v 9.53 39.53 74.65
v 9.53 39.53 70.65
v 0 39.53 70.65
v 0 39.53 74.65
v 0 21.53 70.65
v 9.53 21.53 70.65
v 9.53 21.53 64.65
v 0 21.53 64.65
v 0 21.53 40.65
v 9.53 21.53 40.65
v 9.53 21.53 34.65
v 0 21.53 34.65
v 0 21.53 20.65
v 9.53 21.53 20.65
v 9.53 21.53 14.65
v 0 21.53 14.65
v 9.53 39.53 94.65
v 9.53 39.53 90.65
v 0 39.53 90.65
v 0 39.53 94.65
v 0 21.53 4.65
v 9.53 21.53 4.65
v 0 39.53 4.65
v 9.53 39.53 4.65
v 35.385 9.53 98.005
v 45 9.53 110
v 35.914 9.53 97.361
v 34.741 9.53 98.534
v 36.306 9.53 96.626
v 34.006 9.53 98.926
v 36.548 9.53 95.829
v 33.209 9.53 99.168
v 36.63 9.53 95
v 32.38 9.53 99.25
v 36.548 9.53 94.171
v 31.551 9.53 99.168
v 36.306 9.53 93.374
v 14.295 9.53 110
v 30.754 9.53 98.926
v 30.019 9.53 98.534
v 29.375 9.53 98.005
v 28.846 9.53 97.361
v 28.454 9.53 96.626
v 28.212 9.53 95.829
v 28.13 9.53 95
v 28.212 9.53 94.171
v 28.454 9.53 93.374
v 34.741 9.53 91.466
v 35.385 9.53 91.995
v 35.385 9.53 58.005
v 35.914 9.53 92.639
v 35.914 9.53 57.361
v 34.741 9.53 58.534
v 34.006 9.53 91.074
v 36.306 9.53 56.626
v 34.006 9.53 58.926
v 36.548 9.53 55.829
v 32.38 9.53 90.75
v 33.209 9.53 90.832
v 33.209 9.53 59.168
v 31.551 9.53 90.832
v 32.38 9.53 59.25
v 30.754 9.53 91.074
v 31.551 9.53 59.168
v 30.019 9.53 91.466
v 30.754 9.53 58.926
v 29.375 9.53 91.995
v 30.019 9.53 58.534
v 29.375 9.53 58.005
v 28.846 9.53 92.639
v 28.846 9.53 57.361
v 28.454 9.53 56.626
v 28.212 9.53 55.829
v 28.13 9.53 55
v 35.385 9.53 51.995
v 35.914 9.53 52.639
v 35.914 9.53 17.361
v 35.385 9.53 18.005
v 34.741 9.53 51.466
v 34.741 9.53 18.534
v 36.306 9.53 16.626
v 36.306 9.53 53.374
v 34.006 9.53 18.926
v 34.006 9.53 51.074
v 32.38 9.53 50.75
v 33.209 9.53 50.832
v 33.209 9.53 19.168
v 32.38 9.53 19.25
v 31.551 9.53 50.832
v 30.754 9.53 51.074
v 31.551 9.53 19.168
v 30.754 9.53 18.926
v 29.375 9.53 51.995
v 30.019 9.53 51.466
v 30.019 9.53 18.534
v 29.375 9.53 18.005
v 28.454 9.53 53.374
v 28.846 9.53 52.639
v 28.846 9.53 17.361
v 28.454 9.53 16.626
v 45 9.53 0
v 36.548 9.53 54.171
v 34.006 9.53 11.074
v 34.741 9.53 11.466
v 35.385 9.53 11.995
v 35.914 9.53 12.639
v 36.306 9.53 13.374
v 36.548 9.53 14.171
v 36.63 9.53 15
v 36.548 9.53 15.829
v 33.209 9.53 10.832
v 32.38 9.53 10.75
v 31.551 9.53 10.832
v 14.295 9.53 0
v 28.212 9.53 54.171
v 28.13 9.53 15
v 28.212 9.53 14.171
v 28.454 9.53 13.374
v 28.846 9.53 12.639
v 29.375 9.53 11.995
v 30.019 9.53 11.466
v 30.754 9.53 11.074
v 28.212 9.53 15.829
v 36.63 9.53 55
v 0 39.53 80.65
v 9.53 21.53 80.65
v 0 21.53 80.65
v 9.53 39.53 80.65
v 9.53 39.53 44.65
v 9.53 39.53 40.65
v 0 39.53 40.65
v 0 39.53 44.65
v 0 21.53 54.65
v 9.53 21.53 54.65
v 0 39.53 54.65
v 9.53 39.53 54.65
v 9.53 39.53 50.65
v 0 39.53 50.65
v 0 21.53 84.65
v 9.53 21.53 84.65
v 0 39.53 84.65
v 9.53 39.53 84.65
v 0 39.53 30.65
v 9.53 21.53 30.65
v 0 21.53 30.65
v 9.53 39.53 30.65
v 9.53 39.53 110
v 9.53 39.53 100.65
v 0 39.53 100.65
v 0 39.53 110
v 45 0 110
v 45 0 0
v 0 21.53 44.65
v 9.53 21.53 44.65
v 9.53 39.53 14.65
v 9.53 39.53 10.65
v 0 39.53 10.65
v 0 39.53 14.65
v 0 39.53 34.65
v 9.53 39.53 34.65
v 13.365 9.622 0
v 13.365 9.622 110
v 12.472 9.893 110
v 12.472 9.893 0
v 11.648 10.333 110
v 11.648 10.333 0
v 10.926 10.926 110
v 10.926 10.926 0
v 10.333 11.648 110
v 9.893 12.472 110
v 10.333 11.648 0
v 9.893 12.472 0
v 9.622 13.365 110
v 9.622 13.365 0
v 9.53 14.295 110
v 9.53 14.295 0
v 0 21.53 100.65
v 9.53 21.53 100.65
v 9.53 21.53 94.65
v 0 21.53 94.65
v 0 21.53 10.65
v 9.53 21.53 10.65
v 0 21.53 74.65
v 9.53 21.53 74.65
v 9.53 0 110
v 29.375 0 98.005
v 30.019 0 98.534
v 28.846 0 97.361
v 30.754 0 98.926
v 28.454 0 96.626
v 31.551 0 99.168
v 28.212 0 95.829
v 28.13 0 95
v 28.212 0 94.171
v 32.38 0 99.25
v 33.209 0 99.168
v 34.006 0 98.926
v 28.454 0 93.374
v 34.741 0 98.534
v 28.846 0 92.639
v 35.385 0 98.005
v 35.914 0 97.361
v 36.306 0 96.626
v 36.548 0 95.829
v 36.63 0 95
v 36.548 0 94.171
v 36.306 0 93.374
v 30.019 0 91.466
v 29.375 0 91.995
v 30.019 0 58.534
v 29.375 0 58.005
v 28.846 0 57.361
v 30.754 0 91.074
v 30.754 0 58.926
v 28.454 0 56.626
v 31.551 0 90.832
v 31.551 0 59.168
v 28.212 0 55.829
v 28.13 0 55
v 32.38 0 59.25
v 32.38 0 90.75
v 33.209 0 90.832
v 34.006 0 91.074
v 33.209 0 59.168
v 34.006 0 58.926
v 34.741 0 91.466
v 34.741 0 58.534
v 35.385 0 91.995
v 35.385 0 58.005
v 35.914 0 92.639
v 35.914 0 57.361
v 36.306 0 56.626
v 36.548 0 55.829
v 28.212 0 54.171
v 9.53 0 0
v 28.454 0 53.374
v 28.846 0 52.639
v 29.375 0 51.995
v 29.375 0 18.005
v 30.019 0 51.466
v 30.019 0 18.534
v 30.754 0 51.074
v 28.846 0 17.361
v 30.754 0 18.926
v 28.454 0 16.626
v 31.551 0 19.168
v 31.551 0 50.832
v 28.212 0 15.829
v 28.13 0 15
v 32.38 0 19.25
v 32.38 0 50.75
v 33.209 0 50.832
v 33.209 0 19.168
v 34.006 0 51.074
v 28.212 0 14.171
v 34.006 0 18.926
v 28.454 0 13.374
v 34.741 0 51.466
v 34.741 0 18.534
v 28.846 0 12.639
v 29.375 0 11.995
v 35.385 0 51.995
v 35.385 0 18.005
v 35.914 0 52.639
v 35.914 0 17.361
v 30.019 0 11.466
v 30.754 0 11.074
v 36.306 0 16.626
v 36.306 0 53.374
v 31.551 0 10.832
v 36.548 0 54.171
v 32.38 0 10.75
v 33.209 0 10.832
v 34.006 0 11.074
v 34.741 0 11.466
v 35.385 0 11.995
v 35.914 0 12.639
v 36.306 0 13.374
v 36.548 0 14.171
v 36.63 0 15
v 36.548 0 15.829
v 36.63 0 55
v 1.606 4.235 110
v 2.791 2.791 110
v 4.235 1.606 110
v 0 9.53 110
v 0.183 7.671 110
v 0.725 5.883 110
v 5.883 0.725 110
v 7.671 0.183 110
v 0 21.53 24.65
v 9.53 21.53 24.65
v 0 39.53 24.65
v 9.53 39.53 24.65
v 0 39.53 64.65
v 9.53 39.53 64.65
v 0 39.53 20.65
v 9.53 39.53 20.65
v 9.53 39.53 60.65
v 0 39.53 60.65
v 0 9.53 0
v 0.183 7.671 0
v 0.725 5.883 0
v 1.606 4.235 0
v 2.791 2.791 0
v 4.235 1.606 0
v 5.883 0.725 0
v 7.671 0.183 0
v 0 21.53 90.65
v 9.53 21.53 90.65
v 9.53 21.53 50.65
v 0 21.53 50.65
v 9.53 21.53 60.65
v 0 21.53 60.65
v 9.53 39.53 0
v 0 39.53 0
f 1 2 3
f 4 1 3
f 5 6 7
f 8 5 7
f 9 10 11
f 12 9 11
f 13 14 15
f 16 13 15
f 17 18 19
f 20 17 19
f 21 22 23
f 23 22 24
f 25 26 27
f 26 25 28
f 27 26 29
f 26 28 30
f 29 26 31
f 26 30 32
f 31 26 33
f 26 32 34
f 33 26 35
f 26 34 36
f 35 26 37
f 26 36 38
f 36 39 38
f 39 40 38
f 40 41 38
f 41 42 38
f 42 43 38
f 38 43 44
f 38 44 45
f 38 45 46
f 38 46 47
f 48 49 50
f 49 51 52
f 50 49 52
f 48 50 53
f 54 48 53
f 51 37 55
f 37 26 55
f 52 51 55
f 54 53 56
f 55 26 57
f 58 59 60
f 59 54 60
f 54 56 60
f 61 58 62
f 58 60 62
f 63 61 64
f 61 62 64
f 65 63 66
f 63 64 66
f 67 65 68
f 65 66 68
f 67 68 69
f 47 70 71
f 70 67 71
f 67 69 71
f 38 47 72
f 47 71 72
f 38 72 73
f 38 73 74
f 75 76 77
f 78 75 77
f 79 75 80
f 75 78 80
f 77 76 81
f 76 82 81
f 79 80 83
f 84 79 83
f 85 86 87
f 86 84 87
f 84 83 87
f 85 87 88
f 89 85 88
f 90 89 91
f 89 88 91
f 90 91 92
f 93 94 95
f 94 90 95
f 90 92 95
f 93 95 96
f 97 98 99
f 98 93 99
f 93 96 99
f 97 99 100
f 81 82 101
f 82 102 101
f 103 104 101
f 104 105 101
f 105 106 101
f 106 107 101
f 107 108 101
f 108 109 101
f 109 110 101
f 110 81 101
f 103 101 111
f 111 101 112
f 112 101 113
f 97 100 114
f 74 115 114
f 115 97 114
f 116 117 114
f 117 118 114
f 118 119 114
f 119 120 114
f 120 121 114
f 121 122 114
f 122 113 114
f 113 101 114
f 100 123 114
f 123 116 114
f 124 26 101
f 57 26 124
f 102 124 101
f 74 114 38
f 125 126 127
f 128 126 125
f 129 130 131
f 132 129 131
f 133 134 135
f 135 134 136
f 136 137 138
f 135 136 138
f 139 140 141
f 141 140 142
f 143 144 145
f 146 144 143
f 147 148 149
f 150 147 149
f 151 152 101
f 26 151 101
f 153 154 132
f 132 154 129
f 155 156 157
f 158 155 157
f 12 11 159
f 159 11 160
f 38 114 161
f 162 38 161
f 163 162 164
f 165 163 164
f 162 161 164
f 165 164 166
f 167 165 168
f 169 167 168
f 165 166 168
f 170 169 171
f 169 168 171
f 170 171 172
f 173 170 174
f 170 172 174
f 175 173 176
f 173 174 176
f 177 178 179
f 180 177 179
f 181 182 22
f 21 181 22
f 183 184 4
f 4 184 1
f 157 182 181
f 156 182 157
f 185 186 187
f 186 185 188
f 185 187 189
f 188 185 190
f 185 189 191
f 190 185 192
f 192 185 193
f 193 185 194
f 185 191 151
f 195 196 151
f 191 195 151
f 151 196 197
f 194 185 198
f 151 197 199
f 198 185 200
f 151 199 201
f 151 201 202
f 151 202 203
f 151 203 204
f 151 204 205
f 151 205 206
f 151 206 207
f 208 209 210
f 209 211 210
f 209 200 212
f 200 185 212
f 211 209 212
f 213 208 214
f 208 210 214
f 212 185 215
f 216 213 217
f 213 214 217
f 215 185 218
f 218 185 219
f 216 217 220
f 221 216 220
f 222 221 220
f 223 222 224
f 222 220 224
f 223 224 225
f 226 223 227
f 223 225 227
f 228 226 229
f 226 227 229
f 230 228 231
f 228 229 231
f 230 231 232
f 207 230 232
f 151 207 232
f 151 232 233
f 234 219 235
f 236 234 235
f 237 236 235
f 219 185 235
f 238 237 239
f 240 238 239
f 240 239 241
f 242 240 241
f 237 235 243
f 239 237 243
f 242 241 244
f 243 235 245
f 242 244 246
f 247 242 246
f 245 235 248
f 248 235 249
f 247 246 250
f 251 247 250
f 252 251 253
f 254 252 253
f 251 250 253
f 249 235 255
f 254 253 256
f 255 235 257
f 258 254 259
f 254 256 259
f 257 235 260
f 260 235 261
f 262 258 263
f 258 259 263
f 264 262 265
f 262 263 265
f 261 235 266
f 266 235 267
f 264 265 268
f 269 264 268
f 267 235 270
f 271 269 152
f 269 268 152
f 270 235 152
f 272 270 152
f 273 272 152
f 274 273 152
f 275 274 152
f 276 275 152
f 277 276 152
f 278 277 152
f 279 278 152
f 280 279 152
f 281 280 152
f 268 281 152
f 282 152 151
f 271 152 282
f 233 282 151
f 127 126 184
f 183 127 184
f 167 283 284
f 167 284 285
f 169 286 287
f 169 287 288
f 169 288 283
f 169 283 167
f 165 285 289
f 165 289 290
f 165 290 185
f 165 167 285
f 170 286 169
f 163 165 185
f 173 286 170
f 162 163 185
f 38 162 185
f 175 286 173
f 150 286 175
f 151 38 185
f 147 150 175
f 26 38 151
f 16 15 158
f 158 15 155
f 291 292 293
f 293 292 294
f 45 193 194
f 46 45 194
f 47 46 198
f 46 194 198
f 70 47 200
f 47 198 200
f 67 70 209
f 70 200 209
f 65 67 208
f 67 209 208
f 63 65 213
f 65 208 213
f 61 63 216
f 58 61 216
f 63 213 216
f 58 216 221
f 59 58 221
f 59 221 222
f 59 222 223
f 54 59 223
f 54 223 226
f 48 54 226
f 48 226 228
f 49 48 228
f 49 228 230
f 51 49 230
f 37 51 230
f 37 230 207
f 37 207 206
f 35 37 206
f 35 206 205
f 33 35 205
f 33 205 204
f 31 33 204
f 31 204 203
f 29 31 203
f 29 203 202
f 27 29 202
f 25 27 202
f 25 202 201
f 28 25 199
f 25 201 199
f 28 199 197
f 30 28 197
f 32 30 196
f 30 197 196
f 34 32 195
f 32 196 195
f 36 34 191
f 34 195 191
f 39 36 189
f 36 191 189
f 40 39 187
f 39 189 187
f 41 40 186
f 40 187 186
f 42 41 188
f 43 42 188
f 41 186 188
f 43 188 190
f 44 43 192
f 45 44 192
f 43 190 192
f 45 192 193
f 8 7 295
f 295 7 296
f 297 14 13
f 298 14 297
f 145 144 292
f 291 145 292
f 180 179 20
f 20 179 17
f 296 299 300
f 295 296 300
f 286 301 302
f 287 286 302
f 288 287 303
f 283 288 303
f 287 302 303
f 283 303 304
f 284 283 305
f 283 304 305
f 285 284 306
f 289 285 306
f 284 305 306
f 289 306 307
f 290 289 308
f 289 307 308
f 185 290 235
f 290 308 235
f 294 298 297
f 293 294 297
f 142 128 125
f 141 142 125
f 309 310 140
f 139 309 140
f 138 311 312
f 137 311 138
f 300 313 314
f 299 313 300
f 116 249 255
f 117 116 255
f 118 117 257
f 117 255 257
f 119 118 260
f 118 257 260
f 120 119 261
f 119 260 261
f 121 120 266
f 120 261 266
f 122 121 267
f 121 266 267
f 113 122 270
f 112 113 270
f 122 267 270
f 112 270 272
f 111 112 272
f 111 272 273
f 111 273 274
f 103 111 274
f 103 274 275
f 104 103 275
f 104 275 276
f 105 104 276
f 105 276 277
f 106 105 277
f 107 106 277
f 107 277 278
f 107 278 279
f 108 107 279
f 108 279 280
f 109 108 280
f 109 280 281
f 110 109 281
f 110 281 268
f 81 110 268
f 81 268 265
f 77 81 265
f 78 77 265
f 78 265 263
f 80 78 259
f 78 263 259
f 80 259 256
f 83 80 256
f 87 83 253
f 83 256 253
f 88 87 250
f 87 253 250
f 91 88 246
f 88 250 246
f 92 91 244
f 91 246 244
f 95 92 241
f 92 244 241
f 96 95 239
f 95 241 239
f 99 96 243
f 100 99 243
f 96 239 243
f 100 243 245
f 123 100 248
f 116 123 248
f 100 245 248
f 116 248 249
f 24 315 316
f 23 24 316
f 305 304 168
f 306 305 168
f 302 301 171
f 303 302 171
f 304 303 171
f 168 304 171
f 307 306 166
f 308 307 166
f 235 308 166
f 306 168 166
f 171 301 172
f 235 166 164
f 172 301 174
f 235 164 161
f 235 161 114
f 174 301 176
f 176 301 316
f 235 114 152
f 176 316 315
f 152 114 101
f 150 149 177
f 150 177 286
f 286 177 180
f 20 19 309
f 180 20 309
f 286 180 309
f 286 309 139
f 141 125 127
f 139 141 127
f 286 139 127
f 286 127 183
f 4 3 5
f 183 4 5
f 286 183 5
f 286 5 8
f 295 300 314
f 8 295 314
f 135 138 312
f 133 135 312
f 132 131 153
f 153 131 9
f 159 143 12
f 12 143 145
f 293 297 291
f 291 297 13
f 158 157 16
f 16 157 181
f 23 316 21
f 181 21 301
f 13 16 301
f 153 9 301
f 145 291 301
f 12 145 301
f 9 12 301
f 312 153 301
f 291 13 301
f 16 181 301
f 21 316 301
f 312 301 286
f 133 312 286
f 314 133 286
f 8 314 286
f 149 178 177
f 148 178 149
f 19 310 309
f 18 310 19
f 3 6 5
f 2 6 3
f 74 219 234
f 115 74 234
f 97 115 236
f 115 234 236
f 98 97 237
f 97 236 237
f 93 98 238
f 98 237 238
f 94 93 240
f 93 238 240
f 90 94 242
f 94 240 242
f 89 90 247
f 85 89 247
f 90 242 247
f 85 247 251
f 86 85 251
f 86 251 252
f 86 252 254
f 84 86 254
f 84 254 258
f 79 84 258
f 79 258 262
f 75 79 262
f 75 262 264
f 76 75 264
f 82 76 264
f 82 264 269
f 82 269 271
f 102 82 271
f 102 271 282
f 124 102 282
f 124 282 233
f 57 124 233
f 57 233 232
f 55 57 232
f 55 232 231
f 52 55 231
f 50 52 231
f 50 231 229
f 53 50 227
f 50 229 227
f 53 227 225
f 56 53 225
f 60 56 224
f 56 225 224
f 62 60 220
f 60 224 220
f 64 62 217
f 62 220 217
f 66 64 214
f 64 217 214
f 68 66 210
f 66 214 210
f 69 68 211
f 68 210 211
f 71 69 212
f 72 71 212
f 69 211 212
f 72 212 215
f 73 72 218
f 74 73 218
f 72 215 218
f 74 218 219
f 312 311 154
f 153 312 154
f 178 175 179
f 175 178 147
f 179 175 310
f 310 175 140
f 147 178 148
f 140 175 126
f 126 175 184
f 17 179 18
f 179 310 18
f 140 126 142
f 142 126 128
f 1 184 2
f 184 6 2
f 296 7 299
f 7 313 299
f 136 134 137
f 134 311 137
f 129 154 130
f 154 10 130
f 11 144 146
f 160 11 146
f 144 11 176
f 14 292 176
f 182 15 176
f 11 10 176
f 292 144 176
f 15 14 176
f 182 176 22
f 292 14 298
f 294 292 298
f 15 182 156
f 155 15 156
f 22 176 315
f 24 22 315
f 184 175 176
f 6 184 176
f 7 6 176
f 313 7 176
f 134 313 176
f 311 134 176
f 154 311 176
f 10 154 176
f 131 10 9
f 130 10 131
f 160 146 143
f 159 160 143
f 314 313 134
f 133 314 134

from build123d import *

# Parameters (mm, degrees)
RESSALTO_EXTRUS_O1_DEPTH                  = 110
ESBO_O2_W                                 = 6
ESBO_O2_H                                 = 18
CORTE_EXTRUS_O1_DEPTH                     = 10.53
BROCA_DE_ROSQUEAR_PARA_TARRAXA_DE_M10X1_D = 8.5


with BuildPart() as part:
    # Esboço1 → Ressalto-extrusão1 (new body)
    with BuildSketch(Plane.XY):
        with BuildLine():
            Line((9.53, 0), (45, 0))
            Line((45, 0), (45, 9.53))
            Line((45, 9.53), (14.295, 9.53))
            ThreePointArc((14.295, 9.53), (10.925636188, 10.925636188), (9.53, 14.295))
            Line((9.53, 14.295), (9.53, 39.53))
            Line((9.53, 39.53), (0, 39.53))
            Line((0, 39.53), (0, 9.53))
            ThreePointArc((0, 9.53), (2.791272375, 2.791272375), (9.53, 0))
        make_face()
    extrude(amount=RESSALTO_EXTRUS_O1_DEPTH)

    # Esboço2 → Corte-extrusão1 (cut, through all)
    with BuildSketch(Plane(origin=(9.53, 0, 0), x_dir=(0, 0, -1), z_dir=(1, 0, 0))):
        with Locations((-7.65, 30.53)):
            Rectangle(ESBO_O2_W, ESBO_O2_H)
        with Locations((-97.65, 30.53)):
            Rectangle(ESBO_O2_W, ESBO_O2_H)
        with Locations((-77.65, 30.53)):
            Rectangle(ESBO_O2_W, ESBO_O2_H)
        with Locations((-67.65, 30.53)):
            Rectangle(ESBO_O2_W, ESBO_O2_H)
        with Locations((-57.65, 30.53)):
            Rectangle(ESBO_O2_W, ESBO_O2_H)
        with Locations((-47.65, 30.53)):
            Rectangle(ESBO_O2_W, ESBO_O2_H)
        with Locations((-37.65, 30.53)):
            Rectangle(ESBO_O2_W, ESBO_O2_H)
        with Locations((-27.65, 30.53)):
            Rectangle(ESBO_O2_W, ESBO_O2_H)
        with Locations((-17.65, 30.53)):
            Rectangle(ESBO_O2_W, ESBO_O2_H)
        with Locations((-87.65, 30.53)):
            Rectangle(ESBO_O2_W, ESBO_O2_H)
    extrude(amount=-CORTE_EXTRUS_O1_DEPTH, mode=Mode.SUBTRACT)

    # Broca de rosquear para tarraxa de M10x1.51 (through all)
    with Locations(Plane(origin=(32.38, 9.53, 15), x_dir=(1, 0, 0), z_dir=(0, 1, 0))):
        with Locations((0, 0), (0, -40), (0, -80)):
            Hole(BROCA_DE_ROSQUEAR_PARA_TARRAXA_DE_M10X1_D / 2)


solid = part.part
